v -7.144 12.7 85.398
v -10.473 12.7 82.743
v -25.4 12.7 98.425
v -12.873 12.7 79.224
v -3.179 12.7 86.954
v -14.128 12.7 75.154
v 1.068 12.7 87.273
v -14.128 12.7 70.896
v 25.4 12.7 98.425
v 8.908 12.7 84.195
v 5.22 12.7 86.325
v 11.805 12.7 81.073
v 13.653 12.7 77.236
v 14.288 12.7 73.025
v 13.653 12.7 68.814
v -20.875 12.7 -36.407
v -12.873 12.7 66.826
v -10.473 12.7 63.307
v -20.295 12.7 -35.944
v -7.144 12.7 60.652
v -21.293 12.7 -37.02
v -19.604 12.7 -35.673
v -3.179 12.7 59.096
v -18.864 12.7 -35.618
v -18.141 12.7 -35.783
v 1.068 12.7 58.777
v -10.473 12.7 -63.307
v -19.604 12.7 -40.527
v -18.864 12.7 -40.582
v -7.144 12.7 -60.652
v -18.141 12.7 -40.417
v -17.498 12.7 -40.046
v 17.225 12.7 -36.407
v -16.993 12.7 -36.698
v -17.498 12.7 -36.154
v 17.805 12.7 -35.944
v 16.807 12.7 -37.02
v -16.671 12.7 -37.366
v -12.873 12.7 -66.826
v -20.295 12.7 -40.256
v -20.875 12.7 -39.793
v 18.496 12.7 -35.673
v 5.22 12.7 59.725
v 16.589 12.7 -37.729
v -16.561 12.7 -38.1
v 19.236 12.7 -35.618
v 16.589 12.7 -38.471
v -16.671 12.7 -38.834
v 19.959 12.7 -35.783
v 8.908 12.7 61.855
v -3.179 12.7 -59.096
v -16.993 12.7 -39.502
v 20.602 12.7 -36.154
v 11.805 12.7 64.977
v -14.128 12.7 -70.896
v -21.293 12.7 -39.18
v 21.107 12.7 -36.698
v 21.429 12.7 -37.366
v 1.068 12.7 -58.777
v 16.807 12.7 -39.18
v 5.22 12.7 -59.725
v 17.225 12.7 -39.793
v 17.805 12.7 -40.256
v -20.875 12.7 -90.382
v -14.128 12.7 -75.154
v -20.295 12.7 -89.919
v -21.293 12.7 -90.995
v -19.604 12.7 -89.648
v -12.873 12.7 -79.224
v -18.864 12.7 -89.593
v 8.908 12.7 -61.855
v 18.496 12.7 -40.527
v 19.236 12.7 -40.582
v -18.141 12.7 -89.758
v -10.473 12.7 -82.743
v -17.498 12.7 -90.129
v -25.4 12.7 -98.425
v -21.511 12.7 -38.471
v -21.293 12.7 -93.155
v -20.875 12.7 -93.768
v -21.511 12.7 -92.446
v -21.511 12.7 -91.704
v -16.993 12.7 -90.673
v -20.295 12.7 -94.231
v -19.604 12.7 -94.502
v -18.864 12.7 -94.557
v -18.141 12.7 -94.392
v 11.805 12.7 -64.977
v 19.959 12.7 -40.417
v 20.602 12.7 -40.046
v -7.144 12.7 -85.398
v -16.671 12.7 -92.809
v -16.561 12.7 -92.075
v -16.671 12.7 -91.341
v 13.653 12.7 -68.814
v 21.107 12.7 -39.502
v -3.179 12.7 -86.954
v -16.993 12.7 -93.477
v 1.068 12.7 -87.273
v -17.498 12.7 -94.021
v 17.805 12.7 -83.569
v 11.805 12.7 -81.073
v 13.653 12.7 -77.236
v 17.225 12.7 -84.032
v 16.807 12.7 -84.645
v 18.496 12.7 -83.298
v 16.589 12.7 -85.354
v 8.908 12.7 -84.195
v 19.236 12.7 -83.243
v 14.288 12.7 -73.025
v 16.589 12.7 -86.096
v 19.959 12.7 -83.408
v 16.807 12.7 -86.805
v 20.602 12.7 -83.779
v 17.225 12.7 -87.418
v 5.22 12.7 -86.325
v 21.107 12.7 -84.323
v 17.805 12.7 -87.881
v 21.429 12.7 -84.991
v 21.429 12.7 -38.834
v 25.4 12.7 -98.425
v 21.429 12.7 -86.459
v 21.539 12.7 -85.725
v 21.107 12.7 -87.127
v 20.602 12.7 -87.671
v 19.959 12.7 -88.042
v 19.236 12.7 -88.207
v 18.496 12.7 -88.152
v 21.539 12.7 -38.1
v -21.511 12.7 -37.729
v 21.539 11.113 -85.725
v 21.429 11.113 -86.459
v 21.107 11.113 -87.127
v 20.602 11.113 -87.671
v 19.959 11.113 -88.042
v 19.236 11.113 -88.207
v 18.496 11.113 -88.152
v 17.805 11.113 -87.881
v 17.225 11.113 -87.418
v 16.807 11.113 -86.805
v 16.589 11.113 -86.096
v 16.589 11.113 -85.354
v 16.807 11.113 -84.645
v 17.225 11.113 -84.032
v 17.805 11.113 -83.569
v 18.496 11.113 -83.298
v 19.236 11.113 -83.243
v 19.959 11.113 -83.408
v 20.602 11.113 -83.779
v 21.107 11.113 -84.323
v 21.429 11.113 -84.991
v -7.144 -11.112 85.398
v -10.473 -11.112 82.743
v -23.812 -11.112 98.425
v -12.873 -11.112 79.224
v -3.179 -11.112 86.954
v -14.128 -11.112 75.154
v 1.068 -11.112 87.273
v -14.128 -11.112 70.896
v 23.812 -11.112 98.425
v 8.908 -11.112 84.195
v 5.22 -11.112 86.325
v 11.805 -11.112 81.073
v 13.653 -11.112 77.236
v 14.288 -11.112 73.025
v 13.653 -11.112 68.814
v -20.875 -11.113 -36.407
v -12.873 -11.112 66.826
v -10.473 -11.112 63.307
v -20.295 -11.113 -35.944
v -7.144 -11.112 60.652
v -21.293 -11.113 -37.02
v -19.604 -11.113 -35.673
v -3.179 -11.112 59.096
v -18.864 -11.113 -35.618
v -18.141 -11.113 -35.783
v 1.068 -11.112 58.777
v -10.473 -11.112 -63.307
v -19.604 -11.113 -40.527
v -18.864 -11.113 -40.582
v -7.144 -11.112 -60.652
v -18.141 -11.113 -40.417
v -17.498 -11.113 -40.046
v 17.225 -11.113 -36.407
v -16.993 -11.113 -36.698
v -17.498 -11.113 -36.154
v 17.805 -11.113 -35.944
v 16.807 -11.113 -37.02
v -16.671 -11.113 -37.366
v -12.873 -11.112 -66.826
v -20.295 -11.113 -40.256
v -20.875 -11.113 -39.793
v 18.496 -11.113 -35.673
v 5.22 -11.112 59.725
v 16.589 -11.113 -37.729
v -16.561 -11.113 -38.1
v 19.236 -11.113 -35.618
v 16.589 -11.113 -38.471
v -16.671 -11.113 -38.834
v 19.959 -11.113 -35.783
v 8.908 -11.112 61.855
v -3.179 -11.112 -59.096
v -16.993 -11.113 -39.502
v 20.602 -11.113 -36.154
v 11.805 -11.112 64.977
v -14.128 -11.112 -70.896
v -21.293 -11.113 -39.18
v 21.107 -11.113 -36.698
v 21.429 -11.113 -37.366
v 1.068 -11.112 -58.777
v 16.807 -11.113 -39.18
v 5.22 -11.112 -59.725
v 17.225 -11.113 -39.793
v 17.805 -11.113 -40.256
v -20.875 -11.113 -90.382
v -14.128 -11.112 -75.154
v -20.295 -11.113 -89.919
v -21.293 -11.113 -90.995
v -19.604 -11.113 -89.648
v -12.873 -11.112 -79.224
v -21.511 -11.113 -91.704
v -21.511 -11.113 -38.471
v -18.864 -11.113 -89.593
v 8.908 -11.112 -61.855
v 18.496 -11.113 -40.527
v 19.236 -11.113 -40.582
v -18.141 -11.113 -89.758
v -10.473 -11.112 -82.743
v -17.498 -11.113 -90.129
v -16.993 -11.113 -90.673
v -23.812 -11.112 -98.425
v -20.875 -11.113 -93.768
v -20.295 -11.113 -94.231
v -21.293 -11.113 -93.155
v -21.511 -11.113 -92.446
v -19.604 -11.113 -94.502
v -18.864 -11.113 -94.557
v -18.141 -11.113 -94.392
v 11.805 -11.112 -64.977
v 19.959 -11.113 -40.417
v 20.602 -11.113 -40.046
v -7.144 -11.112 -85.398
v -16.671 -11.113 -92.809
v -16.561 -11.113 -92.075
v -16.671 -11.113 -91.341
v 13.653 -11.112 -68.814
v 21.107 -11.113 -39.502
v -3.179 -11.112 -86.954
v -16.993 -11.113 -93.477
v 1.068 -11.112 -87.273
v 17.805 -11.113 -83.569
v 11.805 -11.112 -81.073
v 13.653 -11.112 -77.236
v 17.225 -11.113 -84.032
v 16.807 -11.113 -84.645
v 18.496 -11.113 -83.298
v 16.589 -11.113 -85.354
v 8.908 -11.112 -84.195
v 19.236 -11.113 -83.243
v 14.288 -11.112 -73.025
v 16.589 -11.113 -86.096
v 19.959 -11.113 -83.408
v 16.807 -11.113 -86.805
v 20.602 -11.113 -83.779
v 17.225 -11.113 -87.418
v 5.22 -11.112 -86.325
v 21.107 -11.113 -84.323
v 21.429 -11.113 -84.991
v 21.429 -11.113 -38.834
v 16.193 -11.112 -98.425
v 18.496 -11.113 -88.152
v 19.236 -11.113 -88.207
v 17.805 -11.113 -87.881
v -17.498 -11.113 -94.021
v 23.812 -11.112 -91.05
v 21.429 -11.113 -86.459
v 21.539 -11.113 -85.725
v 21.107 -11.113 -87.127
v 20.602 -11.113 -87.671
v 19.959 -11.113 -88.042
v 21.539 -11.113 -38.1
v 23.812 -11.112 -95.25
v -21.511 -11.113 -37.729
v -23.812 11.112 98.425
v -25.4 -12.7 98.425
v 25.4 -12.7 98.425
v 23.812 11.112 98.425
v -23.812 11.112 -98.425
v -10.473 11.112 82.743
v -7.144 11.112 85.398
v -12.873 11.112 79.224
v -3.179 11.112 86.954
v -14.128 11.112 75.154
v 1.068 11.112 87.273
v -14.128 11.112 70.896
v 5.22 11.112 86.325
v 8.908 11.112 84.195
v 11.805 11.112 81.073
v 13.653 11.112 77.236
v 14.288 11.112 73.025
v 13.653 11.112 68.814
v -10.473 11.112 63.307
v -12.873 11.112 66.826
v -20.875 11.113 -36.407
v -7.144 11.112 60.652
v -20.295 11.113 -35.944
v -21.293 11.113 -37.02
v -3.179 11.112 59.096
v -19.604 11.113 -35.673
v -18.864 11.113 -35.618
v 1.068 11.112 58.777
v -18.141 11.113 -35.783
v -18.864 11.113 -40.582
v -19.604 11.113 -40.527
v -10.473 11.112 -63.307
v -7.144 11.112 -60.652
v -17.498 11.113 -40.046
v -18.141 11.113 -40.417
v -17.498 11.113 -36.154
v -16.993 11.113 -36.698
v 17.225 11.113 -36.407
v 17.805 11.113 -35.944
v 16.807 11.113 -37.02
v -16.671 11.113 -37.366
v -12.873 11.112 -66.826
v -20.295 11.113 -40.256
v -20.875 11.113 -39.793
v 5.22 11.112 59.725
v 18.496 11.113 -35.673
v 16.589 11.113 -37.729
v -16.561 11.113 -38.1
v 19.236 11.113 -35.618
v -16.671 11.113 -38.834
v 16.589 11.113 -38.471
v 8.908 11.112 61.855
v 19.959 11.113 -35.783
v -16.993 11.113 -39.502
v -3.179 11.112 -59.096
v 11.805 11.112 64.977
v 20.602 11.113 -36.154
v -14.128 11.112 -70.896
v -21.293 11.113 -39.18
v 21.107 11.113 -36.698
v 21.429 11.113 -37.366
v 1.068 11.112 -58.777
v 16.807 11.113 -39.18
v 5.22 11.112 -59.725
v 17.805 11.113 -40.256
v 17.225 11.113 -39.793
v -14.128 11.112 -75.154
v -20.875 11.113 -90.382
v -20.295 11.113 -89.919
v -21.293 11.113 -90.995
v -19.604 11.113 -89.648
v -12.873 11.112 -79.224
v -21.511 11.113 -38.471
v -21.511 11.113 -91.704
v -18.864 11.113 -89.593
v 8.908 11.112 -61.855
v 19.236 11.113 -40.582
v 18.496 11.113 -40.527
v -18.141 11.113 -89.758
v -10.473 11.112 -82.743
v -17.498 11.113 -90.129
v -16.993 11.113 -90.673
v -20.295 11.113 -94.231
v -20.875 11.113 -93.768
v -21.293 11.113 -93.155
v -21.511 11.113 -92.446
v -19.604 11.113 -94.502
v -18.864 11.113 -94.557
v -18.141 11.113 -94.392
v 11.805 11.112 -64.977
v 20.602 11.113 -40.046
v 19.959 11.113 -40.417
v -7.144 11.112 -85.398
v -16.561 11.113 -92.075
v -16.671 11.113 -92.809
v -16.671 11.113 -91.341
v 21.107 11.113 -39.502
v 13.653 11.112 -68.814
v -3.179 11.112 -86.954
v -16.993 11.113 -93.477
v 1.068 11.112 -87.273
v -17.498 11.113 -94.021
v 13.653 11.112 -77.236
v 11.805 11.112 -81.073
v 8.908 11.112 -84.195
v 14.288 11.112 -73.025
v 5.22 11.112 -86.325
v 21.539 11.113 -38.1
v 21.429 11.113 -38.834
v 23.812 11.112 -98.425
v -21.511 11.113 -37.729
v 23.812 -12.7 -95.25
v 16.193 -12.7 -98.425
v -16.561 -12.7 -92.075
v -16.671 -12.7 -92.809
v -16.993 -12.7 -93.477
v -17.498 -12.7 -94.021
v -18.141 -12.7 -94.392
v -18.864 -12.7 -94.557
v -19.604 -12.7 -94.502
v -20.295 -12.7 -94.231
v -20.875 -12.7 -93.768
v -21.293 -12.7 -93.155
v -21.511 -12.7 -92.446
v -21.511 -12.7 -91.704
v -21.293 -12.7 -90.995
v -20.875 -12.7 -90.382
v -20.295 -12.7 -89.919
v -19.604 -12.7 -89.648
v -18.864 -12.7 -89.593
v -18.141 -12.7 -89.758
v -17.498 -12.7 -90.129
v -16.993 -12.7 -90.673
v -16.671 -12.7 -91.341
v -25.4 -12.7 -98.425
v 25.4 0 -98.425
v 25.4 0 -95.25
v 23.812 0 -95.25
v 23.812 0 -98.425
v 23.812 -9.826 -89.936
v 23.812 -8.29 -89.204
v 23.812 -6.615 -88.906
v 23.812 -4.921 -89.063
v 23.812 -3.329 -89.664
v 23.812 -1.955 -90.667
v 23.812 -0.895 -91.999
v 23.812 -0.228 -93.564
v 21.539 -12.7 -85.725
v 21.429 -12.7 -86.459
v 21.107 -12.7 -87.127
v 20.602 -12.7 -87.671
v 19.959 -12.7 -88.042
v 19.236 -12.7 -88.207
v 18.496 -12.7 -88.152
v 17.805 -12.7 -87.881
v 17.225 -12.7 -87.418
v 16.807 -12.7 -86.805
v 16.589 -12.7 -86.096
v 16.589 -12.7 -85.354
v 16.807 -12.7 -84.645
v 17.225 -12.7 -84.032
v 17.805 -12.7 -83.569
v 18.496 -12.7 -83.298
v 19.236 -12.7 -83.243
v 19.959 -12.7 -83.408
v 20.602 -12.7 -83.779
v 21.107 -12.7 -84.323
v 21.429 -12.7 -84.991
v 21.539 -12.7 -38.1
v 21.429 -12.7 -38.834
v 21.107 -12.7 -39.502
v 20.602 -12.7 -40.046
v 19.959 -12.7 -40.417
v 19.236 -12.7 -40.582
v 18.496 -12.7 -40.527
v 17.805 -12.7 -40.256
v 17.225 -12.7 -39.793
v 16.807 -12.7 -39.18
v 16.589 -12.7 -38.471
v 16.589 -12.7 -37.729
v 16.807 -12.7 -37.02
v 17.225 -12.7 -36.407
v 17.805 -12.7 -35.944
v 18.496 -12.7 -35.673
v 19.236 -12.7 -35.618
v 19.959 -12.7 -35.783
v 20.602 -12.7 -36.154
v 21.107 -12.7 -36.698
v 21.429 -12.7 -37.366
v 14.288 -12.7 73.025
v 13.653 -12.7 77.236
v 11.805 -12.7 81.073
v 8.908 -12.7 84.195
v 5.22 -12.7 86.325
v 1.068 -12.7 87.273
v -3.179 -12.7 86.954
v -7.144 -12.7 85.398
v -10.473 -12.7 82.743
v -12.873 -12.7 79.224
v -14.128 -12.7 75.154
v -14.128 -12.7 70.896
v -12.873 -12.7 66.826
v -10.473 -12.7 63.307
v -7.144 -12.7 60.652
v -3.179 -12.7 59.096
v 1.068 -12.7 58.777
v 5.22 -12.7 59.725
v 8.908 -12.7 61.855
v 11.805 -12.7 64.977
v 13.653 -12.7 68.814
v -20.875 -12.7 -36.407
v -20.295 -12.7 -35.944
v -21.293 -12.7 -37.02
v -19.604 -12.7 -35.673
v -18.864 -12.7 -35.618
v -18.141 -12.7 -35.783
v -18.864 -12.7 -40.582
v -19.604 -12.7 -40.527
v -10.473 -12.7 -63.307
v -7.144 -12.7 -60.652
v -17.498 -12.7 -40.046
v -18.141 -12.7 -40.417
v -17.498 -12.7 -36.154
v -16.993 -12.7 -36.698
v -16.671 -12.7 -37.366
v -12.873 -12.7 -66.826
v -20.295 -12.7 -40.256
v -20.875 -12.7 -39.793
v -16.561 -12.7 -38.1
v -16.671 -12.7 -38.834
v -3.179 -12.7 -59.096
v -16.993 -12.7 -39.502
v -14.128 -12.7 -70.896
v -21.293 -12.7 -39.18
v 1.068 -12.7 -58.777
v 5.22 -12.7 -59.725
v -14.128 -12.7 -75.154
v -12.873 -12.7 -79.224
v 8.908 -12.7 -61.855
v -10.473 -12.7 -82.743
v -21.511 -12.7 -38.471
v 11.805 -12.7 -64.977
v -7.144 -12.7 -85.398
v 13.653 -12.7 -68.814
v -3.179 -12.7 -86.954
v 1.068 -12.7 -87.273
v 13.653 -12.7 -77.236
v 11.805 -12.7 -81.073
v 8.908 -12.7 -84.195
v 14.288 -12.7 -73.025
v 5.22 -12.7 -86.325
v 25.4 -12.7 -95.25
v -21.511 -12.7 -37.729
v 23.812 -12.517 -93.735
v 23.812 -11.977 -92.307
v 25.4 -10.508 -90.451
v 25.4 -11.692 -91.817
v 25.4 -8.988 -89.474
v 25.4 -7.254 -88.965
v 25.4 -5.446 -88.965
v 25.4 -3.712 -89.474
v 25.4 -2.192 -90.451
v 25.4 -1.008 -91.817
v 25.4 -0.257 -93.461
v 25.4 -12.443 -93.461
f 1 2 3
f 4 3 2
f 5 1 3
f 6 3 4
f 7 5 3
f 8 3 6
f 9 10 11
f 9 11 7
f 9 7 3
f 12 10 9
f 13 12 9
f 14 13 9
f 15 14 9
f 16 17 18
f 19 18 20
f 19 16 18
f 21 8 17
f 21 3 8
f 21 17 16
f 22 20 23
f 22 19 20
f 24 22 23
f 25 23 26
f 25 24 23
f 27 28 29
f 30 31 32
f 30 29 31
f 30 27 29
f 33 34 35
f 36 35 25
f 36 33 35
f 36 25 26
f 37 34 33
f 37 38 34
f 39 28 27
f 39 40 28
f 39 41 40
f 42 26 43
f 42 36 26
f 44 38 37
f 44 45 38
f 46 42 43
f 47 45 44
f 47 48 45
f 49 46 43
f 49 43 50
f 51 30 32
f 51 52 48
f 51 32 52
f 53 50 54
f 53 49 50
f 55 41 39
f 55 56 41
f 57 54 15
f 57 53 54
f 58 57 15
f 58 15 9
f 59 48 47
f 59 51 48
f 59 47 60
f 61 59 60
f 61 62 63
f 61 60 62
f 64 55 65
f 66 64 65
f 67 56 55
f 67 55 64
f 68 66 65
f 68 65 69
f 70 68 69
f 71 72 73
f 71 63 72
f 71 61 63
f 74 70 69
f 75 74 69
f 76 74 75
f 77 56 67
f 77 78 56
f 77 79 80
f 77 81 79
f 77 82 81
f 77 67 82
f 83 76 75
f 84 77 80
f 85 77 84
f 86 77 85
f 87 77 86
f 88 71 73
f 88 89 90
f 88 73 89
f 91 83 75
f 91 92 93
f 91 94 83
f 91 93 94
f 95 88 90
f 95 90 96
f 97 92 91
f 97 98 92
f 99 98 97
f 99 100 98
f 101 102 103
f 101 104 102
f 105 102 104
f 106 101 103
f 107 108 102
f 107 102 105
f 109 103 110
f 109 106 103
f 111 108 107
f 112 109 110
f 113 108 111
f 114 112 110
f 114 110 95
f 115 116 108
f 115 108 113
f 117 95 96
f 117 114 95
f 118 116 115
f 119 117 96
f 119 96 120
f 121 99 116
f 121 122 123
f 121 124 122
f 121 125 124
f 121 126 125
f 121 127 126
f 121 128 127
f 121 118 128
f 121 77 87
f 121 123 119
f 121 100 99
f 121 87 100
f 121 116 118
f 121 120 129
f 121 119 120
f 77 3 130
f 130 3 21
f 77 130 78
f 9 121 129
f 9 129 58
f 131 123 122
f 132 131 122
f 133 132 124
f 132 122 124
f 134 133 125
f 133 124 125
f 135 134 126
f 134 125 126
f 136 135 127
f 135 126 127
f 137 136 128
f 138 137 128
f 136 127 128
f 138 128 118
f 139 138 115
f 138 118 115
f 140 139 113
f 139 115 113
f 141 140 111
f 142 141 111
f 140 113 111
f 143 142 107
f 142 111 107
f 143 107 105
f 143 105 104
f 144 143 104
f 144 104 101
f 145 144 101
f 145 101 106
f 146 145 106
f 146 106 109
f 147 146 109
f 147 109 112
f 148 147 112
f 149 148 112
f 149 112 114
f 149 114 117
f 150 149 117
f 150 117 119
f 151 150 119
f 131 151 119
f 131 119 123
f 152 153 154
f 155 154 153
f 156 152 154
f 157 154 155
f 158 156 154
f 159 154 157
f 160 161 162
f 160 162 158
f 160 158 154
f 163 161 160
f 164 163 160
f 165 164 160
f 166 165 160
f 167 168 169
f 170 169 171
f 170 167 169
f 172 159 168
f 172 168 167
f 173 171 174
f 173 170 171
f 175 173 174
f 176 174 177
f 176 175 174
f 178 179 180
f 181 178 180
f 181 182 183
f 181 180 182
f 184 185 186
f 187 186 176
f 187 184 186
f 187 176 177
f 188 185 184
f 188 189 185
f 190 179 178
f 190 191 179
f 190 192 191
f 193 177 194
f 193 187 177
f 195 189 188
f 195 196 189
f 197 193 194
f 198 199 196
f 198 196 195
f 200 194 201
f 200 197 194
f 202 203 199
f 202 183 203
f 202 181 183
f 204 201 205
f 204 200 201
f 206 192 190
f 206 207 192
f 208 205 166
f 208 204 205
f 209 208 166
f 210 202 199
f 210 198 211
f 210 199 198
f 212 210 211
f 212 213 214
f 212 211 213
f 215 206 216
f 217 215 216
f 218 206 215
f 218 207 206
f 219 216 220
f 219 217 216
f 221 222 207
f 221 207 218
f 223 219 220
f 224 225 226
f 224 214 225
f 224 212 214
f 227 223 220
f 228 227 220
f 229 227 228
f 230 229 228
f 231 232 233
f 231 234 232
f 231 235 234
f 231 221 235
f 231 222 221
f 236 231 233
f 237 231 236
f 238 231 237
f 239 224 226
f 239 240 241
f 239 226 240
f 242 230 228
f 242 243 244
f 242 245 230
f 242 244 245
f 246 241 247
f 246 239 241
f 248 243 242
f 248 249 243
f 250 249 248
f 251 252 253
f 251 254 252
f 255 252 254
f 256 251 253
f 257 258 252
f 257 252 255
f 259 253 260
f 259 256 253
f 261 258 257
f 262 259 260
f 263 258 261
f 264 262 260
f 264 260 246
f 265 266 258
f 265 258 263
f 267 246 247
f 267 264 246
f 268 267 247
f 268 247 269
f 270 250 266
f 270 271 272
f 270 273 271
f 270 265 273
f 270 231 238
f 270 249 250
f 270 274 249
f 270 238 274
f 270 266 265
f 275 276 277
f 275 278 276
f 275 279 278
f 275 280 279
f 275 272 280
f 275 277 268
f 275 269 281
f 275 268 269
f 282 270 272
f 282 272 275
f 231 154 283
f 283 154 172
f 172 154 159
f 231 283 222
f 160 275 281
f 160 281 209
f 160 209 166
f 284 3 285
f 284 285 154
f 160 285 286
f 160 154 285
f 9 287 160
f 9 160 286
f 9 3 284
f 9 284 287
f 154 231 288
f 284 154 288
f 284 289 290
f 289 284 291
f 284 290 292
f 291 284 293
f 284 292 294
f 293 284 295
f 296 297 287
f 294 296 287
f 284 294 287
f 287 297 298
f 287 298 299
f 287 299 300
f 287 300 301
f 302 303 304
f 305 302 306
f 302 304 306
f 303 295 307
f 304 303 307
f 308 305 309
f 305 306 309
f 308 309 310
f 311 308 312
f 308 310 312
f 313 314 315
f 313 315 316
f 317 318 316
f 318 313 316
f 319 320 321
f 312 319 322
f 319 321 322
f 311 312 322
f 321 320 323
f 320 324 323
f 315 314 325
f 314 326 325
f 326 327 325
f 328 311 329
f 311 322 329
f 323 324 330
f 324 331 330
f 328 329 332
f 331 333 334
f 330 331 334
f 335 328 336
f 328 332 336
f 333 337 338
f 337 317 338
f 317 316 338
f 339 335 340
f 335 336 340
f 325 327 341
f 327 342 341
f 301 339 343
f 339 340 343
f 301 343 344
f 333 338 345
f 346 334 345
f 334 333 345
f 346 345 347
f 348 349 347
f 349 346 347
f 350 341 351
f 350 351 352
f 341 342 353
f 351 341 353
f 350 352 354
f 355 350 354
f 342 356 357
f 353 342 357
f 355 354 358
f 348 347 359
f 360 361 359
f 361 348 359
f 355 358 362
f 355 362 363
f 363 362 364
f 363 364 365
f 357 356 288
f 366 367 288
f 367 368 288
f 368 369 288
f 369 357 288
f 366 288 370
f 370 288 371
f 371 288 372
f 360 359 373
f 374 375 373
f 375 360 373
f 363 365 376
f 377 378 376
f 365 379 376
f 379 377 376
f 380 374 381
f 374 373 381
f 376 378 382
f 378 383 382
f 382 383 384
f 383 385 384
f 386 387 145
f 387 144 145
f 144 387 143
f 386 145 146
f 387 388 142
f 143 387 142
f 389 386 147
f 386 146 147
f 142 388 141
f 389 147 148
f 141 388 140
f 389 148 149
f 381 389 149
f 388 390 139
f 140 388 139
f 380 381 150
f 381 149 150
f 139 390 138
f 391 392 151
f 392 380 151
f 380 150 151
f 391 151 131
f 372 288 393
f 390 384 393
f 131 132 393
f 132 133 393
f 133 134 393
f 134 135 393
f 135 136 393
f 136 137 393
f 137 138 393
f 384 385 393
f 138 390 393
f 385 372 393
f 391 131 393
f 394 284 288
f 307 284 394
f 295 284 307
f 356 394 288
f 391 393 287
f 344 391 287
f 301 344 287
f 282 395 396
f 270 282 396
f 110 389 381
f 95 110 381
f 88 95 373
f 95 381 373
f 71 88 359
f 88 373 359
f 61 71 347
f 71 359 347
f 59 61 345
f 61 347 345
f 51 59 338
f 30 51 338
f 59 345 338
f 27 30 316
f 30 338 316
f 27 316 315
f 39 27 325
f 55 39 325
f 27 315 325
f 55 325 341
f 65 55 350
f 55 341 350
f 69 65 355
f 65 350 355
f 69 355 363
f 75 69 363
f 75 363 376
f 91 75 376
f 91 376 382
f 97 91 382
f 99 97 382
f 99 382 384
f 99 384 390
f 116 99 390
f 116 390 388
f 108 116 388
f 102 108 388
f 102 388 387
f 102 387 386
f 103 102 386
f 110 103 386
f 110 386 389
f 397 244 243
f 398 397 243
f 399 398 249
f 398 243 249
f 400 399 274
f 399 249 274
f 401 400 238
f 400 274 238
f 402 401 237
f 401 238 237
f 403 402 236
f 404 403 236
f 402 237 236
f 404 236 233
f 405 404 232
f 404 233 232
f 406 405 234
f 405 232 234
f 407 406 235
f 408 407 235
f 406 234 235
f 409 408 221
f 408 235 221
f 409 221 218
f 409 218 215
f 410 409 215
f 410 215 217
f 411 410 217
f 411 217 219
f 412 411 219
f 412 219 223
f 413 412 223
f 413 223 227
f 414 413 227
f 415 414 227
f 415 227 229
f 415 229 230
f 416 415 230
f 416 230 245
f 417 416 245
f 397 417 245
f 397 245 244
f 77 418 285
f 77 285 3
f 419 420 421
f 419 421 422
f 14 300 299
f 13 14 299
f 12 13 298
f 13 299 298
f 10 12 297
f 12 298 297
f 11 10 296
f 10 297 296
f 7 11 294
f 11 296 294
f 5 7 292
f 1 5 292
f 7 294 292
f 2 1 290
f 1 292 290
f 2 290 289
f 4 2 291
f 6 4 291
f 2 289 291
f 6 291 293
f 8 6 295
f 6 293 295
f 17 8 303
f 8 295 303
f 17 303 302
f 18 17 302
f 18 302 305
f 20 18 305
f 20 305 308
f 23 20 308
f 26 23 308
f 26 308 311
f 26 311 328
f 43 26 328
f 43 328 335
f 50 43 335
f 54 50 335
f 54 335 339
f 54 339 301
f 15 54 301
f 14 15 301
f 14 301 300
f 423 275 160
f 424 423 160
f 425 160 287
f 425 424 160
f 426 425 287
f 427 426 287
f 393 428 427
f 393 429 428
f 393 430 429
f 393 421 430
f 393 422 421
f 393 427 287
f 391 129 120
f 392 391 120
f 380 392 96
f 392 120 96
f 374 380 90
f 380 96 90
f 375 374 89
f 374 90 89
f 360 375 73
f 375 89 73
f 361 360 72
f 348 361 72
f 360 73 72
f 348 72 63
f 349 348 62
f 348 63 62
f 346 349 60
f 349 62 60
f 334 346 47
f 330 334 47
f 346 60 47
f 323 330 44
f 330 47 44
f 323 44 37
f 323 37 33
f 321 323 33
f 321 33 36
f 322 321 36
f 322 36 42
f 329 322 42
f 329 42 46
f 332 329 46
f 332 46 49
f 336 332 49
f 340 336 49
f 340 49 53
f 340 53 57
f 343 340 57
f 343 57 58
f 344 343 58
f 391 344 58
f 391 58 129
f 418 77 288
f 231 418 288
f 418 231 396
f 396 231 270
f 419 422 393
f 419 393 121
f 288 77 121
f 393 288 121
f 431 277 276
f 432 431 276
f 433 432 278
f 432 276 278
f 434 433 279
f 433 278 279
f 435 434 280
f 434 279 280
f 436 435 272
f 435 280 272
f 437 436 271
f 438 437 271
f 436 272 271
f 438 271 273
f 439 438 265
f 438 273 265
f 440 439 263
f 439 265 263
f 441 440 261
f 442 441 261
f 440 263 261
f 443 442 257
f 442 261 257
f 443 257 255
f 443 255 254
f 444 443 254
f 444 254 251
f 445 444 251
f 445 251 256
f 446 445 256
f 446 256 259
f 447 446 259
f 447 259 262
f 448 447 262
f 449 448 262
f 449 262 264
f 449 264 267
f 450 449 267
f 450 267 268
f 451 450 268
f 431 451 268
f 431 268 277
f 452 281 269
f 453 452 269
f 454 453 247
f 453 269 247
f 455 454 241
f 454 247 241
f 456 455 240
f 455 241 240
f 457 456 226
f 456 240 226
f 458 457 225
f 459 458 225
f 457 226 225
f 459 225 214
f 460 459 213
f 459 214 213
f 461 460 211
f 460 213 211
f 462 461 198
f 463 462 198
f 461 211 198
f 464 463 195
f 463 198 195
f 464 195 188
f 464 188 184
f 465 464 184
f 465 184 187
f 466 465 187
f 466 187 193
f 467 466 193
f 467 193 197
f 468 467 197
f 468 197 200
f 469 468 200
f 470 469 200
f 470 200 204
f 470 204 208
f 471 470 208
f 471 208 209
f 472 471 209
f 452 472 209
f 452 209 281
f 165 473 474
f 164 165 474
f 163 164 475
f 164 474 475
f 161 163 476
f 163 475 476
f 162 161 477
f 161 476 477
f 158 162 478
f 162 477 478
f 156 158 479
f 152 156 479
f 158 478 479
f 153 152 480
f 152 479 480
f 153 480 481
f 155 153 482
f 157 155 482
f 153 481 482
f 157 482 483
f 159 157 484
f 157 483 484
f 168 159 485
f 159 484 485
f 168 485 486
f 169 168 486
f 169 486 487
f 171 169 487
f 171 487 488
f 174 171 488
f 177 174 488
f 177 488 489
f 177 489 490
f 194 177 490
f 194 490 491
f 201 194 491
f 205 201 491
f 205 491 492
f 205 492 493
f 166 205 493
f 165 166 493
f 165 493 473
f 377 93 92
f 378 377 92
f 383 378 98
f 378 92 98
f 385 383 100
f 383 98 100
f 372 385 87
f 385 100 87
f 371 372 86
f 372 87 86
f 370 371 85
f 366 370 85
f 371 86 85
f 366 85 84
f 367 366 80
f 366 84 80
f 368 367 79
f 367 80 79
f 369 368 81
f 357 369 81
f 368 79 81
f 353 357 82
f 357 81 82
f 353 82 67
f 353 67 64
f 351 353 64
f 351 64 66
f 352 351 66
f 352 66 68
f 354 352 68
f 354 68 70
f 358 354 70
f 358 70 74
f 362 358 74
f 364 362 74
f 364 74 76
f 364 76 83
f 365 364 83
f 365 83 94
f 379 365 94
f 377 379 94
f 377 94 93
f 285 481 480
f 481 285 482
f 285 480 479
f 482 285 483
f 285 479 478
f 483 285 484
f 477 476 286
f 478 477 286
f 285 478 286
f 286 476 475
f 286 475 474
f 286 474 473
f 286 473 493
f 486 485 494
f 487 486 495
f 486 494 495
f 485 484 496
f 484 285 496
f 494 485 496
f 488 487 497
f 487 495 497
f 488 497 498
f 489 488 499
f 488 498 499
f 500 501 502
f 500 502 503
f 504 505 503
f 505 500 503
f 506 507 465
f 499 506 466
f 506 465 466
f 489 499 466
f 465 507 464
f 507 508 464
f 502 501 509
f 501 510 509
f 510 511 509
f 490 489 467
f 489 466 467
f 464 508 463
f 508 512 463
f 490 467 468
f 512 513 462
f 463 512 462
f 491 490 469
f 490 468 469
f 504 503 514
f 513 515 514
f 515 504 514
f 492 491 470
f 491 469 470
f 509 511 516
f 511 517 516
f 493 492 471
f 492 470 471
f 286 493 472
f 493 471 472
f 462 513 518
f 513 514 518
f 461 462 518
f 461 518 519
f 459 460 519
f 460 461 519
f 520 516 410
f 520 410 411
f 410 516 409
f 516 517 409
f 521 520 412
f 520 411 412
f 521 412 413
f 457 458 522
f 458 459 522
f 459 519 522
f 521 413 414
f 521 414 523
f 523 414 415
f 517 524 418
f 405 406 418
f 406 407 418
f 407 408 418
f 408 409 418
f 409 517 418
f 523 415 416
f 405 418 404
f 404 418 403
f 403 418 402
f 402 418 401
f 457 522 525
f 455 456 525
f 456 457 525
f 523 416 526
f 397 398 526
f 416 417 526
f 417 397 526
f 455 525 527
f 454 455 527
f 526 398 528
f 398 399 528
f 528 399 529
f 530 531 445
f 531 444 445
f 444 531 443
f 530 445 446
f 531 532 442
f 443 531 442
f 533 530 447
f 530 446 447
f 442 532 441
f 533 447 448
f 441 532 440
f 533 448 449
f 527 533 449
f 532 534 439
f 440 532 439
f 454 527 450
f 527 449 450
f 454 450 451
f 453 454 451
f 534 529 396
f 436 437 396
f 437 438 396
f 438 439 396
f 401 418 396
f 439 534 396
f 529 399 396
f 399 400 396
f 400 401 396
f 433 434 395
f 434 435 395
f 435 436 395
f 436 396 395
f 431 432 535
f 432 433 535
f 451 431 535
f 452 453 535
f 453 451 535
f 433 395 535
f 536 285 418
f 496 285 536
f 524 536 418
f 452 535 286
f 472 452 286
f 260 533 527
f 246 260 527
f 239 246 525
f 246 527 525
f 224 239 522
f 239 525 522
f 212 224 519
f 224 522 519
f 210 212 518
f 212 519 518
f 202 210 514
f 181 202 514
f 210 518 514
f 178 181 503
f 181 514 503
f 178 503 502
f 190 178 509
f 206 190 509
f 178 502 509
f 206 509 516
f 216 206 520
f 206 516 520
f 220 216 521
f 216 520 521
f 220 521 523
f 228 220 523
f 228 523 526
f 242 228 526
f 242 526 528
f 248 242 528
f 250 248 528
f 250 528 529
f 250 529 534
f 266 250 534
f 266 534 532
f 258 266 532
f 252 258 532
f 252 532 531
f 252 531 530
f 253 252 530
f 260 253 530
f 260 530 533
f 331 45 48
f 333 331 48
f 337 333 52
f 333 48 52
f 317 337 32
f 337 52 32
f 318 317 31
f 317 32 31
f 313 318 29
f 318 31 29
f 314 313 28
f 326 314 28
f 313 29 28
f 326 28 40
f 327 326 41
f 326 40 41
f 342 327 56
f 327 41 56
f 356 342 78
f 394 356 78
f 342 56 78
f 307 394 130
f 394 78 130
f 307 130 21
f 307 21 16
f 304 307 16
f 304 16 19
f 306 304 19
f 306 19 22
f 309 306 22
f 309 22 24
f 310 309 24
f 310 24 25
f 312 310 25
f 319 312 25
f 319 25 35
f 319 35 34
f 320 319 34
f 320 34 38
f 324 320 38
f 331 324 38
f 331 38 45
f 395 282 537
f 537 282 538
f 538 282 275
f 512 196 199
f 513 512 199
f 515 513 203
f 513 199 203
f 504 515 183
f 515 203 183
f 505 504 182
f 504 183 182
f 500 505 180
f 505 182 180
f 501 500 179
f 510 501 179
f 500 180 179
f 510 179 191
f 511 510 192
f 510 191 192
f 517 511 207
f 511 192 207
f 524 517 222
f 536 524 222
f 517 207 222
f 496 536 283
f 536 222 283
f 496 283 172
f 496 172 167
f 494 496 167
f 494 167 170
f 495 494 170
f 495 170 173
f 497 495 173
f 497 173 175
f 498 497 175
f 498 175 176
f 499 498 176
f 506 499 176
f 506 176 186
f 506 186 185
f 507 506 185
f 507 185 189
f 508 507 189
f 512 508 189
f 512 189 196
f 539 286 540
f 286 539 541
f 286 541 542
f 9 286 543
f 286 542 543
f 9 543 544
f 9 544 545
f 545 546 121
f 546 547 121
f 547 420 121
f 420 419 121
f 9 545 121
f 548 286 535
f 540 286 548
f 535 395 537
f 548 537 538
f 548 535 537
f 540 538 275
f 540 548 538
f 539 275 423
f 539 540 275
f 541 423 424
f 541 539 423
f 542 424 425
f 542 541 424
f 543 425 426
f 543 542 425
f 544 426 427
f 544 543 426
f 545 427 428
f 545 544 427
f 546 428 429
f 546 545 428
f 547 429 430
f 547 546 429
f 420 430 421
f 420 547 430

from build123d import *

# Parameters (mm, degrees)
BOSS_EXTRUDE1_DEPTH      = 98.424999
BOSS_EXTRUDE1_DEPTH_BACK = 98.424999
SKETCH3_W                = 50.8
SKETCH3_H                = 25.4
SKETCH3_W_2              = 47.625
SKETCH3_H_2              = 22.225
SKETCH4_R                = 14.2875
CUT_EXTRUDE3_DEPTH       = 105.774999061
CUT_EXTRUDE5_DEPTH       = 1.5875
CUT_EXTRUDE6_DEPTH       = 1.5875
F_10_CLEARANCE_HOLE1_D   = 4.9784


with BuildPart() as part:
    # Sketch3 → Boss-Extrude1 (new, two sides: drawn at the far end of the back side and taken through both)
    with BuildSketch(Plane.XY.offset(-BOSS_EXTRUDE1_DEPTH_BACK)):
        Rectangle(SKETCH3_W, SKETCH3_H)
        Rectangle(SKETCH3_W_2, SKETCH3_H_2, mode=Mode.SUBTRACT)
    extrude(amount=BOSS_EXTRUDE1_DEPTH + BOSS_EXTRUDE1_DEPTH_BACK)

    # Sketch4 → Cut-Extrude3 (cut, through all)
    with BuildSketch(Plane.XZ.offset(12.7)):
        with Locations((0, 73.025)):
            Circle(SKETCH4_R)
        with Locations((0, -73.025)):
            Circle(SKETCH4_R)
    extrude(amount=-CUT_EXTRUDE3_DEPTH, mode=Mode.SUBTRACT)

    # Sketch5 → Cut-Extrude5 (cut)
    with BuildSketch(Plane(origin=(25.4, 0, 0), x_dir=(0, 0, -1), z_dir=(1, 0, 0))):
        with BuildLine():
            Line((98.424999492, 0), (98.424999492, -12.7))
            Line((98.424999492, -12.7), (95.249999492, -12.7))
            ThreePointArc((95.249999492, -12.7), (88.899999492, -6.35), (95.249999492, 0))
            Line((95.249999492, 0), (98.424999492, 0))
        make_face()
    extrude(amount=-CUT_EXTRUDE5_DEPTH, mode=Mode.SUBTRACT)

    # Sketch6 → Cut-Extrude6 (cut)
    with BuildSketch(Plane.XZ.offset(12.7)):
        Polygon((23.8125, -98.424999492), (23.8125, -95.249999492), (16.1925, -98.424999492), align=None)
    extrude(amount=-CUT_EXTRUDE6_DEPTH, mode=Mode.SUBTRACT)

    # #10 Clearance Hole1 (through all)
    with Locations(Plane(origin=(0, -12.7, 0), x_dir=(-1, 0, 0), z_dir=(0, -1, 0))):
        with Locations((-19.05, 85.724999492), (19.05, 92.074999492), (19.05, 38.099999492), (-19.05, 38.099999492)):
            Hole(F_10_CLEARANCE_HOLE1_D / 2)


solid = part.part
